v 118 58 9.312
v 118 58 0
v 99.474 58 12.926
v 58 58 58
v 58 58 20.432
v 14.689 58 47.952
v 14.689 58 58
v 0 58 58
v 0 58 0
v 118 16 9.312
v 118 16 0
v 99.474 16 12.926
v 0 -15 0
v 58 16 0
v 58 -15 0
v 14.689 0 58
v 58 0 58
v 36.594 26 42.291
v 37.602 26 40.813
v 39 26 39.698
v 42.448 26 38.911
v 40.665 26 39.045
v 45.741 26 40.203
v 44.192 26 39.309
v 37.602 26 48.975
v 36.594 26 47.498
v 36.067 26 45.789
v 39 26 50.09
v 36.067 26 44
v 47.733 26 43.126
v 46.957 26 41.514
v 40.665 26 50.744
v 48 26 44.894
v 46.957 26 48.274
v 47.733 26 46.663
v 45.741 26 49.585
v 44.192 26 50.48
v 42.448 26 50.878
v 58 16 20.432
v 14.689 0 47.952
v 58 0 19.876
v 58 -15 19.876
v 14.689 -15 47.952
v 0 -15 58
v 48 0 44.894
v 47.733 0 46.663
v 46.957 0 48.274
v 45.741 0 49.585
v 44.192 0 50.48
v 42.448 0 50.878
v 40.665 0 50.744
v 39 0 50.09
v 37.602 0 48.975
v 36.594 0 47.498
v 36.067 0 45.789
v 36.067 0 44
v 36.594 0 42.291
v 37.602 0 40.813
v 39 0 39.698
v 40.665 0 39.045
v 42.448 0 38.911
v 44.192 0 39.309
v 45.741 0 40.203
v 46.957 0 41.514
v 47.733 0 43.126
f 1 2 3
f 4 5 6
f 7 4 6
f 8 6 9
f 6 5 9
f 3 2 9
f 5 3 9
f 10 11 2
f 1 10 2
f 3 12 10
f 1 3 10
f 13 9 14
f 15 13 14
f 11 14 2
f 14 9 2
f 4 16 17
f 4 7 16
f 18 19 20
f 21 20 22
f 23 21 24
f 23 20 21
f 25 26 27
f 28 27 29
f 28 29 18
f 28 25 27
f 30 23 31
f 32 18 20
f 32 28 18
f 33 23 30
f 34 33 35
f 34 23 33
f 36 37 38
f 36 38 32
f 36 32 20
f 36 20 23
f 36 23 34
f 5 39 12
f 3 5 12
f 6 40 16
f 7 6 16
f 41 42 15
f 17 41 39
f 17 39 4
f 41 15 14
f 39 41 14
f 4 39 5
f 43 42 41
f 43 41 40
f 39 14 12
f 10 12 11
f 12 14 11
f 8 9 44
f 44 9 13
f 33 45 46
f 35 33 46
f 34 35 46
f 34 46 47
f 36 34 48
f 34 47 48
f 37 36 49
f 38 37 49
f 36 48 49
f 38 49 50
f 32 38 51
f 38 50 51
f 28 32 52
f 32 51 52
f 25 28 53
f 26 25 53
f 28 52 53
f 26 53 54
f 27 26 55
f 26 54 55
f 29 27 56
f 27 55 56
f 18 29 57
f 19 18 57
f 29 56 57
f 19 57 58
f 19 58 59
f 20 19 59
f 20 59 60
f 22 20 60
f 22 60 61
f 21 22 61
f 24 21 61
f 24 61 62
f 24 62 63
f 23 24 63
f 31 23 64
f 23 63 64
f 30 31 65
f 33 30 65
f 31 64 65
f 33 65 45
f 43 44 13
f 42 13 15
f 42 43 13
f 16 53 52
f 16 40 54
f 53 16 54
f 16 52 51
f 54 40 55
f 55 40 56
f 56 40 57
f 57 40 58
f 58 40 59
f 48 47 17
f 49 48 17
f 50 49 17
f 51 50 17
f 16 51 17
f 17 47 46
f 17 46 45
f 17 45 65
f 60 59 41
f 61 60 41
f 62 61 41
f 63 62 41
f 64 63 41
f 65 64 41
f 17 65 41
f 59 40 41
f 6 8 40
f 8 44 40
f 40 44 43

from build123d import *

# Parameters (mm, degrees)
F1_DEPTH  = 58
F3_DEPTH  = 58.001
F6_DEPTH  = 42.001
F7_DEPTH  = 15
F9_DEPTH  = 42.001
F10_R     = 6
F11_DEPTH = 26


with BuildPart() as f1:
    # F0 (on Top) → F1 (new body)
    with BuildSketch(Plane.XY):
        Polygon((0, 58), (0, 0), (58, 0), (58, 16), (16, 16), (16, 42), (88, 42), (88, 16), (118, 16), (118, 58), align=None)
        Polygon((16, 16), (58, 16), (88, 16), (88, 42), (16, 42), align=None)
    extrude(amount=F1_DEPTH)

    # F2 (on face) → F3 (cut, through all)
    with BuildSketch(Plane.XZ):
        Polygon((14.689402, 58), (0, 58), (14.689402, 47.95216), align=None)
    extrude(amount=-F3_DEPTH, mode=Mode.SUBTRACT)

    # F5 (on face) → F6 (cut, through all)
    with BuildSketch(Plane.XZ.offset(-16)):
        Polygon((118, 58), (97.528502, 58), (99.474385, 12.926235), (118, 9.312449), align=None)
    extrude(amount=-F6_DEPTH, mode=Mode.SUBTRACT)

    # F4 (on face) → F7 (join, symmetric)
    with BuildSketch(Plane.XZ):
        Polygon((58, 19.875824), (14.689402, 47.95216), (0, 58), (0, 0), (58, 0), align=None)
    extrude(amount=F7_DEPTH, both=True)

    # F8 (on face) → F9 (cut, through all)
    with BuildSketch(Plane.XZ.offset(-16)):
        Polygon((97.528502, 58), (58, 58), (58, 20.431791), (99.474385, 12.926235), align=None)
    extrude(amount=-F9_DEPTH, mode=Mode.SUBTRACT)

    # F10 (on face) → F11 (cut)
    with BuildSketch(Plane.XZ):
        with Locations((42, 44.894345)):
            Circle(F10_R)
    extrude(amount=-F11_DEPTH, mode=Mode.SUBTRACT)


solid = f1.part
